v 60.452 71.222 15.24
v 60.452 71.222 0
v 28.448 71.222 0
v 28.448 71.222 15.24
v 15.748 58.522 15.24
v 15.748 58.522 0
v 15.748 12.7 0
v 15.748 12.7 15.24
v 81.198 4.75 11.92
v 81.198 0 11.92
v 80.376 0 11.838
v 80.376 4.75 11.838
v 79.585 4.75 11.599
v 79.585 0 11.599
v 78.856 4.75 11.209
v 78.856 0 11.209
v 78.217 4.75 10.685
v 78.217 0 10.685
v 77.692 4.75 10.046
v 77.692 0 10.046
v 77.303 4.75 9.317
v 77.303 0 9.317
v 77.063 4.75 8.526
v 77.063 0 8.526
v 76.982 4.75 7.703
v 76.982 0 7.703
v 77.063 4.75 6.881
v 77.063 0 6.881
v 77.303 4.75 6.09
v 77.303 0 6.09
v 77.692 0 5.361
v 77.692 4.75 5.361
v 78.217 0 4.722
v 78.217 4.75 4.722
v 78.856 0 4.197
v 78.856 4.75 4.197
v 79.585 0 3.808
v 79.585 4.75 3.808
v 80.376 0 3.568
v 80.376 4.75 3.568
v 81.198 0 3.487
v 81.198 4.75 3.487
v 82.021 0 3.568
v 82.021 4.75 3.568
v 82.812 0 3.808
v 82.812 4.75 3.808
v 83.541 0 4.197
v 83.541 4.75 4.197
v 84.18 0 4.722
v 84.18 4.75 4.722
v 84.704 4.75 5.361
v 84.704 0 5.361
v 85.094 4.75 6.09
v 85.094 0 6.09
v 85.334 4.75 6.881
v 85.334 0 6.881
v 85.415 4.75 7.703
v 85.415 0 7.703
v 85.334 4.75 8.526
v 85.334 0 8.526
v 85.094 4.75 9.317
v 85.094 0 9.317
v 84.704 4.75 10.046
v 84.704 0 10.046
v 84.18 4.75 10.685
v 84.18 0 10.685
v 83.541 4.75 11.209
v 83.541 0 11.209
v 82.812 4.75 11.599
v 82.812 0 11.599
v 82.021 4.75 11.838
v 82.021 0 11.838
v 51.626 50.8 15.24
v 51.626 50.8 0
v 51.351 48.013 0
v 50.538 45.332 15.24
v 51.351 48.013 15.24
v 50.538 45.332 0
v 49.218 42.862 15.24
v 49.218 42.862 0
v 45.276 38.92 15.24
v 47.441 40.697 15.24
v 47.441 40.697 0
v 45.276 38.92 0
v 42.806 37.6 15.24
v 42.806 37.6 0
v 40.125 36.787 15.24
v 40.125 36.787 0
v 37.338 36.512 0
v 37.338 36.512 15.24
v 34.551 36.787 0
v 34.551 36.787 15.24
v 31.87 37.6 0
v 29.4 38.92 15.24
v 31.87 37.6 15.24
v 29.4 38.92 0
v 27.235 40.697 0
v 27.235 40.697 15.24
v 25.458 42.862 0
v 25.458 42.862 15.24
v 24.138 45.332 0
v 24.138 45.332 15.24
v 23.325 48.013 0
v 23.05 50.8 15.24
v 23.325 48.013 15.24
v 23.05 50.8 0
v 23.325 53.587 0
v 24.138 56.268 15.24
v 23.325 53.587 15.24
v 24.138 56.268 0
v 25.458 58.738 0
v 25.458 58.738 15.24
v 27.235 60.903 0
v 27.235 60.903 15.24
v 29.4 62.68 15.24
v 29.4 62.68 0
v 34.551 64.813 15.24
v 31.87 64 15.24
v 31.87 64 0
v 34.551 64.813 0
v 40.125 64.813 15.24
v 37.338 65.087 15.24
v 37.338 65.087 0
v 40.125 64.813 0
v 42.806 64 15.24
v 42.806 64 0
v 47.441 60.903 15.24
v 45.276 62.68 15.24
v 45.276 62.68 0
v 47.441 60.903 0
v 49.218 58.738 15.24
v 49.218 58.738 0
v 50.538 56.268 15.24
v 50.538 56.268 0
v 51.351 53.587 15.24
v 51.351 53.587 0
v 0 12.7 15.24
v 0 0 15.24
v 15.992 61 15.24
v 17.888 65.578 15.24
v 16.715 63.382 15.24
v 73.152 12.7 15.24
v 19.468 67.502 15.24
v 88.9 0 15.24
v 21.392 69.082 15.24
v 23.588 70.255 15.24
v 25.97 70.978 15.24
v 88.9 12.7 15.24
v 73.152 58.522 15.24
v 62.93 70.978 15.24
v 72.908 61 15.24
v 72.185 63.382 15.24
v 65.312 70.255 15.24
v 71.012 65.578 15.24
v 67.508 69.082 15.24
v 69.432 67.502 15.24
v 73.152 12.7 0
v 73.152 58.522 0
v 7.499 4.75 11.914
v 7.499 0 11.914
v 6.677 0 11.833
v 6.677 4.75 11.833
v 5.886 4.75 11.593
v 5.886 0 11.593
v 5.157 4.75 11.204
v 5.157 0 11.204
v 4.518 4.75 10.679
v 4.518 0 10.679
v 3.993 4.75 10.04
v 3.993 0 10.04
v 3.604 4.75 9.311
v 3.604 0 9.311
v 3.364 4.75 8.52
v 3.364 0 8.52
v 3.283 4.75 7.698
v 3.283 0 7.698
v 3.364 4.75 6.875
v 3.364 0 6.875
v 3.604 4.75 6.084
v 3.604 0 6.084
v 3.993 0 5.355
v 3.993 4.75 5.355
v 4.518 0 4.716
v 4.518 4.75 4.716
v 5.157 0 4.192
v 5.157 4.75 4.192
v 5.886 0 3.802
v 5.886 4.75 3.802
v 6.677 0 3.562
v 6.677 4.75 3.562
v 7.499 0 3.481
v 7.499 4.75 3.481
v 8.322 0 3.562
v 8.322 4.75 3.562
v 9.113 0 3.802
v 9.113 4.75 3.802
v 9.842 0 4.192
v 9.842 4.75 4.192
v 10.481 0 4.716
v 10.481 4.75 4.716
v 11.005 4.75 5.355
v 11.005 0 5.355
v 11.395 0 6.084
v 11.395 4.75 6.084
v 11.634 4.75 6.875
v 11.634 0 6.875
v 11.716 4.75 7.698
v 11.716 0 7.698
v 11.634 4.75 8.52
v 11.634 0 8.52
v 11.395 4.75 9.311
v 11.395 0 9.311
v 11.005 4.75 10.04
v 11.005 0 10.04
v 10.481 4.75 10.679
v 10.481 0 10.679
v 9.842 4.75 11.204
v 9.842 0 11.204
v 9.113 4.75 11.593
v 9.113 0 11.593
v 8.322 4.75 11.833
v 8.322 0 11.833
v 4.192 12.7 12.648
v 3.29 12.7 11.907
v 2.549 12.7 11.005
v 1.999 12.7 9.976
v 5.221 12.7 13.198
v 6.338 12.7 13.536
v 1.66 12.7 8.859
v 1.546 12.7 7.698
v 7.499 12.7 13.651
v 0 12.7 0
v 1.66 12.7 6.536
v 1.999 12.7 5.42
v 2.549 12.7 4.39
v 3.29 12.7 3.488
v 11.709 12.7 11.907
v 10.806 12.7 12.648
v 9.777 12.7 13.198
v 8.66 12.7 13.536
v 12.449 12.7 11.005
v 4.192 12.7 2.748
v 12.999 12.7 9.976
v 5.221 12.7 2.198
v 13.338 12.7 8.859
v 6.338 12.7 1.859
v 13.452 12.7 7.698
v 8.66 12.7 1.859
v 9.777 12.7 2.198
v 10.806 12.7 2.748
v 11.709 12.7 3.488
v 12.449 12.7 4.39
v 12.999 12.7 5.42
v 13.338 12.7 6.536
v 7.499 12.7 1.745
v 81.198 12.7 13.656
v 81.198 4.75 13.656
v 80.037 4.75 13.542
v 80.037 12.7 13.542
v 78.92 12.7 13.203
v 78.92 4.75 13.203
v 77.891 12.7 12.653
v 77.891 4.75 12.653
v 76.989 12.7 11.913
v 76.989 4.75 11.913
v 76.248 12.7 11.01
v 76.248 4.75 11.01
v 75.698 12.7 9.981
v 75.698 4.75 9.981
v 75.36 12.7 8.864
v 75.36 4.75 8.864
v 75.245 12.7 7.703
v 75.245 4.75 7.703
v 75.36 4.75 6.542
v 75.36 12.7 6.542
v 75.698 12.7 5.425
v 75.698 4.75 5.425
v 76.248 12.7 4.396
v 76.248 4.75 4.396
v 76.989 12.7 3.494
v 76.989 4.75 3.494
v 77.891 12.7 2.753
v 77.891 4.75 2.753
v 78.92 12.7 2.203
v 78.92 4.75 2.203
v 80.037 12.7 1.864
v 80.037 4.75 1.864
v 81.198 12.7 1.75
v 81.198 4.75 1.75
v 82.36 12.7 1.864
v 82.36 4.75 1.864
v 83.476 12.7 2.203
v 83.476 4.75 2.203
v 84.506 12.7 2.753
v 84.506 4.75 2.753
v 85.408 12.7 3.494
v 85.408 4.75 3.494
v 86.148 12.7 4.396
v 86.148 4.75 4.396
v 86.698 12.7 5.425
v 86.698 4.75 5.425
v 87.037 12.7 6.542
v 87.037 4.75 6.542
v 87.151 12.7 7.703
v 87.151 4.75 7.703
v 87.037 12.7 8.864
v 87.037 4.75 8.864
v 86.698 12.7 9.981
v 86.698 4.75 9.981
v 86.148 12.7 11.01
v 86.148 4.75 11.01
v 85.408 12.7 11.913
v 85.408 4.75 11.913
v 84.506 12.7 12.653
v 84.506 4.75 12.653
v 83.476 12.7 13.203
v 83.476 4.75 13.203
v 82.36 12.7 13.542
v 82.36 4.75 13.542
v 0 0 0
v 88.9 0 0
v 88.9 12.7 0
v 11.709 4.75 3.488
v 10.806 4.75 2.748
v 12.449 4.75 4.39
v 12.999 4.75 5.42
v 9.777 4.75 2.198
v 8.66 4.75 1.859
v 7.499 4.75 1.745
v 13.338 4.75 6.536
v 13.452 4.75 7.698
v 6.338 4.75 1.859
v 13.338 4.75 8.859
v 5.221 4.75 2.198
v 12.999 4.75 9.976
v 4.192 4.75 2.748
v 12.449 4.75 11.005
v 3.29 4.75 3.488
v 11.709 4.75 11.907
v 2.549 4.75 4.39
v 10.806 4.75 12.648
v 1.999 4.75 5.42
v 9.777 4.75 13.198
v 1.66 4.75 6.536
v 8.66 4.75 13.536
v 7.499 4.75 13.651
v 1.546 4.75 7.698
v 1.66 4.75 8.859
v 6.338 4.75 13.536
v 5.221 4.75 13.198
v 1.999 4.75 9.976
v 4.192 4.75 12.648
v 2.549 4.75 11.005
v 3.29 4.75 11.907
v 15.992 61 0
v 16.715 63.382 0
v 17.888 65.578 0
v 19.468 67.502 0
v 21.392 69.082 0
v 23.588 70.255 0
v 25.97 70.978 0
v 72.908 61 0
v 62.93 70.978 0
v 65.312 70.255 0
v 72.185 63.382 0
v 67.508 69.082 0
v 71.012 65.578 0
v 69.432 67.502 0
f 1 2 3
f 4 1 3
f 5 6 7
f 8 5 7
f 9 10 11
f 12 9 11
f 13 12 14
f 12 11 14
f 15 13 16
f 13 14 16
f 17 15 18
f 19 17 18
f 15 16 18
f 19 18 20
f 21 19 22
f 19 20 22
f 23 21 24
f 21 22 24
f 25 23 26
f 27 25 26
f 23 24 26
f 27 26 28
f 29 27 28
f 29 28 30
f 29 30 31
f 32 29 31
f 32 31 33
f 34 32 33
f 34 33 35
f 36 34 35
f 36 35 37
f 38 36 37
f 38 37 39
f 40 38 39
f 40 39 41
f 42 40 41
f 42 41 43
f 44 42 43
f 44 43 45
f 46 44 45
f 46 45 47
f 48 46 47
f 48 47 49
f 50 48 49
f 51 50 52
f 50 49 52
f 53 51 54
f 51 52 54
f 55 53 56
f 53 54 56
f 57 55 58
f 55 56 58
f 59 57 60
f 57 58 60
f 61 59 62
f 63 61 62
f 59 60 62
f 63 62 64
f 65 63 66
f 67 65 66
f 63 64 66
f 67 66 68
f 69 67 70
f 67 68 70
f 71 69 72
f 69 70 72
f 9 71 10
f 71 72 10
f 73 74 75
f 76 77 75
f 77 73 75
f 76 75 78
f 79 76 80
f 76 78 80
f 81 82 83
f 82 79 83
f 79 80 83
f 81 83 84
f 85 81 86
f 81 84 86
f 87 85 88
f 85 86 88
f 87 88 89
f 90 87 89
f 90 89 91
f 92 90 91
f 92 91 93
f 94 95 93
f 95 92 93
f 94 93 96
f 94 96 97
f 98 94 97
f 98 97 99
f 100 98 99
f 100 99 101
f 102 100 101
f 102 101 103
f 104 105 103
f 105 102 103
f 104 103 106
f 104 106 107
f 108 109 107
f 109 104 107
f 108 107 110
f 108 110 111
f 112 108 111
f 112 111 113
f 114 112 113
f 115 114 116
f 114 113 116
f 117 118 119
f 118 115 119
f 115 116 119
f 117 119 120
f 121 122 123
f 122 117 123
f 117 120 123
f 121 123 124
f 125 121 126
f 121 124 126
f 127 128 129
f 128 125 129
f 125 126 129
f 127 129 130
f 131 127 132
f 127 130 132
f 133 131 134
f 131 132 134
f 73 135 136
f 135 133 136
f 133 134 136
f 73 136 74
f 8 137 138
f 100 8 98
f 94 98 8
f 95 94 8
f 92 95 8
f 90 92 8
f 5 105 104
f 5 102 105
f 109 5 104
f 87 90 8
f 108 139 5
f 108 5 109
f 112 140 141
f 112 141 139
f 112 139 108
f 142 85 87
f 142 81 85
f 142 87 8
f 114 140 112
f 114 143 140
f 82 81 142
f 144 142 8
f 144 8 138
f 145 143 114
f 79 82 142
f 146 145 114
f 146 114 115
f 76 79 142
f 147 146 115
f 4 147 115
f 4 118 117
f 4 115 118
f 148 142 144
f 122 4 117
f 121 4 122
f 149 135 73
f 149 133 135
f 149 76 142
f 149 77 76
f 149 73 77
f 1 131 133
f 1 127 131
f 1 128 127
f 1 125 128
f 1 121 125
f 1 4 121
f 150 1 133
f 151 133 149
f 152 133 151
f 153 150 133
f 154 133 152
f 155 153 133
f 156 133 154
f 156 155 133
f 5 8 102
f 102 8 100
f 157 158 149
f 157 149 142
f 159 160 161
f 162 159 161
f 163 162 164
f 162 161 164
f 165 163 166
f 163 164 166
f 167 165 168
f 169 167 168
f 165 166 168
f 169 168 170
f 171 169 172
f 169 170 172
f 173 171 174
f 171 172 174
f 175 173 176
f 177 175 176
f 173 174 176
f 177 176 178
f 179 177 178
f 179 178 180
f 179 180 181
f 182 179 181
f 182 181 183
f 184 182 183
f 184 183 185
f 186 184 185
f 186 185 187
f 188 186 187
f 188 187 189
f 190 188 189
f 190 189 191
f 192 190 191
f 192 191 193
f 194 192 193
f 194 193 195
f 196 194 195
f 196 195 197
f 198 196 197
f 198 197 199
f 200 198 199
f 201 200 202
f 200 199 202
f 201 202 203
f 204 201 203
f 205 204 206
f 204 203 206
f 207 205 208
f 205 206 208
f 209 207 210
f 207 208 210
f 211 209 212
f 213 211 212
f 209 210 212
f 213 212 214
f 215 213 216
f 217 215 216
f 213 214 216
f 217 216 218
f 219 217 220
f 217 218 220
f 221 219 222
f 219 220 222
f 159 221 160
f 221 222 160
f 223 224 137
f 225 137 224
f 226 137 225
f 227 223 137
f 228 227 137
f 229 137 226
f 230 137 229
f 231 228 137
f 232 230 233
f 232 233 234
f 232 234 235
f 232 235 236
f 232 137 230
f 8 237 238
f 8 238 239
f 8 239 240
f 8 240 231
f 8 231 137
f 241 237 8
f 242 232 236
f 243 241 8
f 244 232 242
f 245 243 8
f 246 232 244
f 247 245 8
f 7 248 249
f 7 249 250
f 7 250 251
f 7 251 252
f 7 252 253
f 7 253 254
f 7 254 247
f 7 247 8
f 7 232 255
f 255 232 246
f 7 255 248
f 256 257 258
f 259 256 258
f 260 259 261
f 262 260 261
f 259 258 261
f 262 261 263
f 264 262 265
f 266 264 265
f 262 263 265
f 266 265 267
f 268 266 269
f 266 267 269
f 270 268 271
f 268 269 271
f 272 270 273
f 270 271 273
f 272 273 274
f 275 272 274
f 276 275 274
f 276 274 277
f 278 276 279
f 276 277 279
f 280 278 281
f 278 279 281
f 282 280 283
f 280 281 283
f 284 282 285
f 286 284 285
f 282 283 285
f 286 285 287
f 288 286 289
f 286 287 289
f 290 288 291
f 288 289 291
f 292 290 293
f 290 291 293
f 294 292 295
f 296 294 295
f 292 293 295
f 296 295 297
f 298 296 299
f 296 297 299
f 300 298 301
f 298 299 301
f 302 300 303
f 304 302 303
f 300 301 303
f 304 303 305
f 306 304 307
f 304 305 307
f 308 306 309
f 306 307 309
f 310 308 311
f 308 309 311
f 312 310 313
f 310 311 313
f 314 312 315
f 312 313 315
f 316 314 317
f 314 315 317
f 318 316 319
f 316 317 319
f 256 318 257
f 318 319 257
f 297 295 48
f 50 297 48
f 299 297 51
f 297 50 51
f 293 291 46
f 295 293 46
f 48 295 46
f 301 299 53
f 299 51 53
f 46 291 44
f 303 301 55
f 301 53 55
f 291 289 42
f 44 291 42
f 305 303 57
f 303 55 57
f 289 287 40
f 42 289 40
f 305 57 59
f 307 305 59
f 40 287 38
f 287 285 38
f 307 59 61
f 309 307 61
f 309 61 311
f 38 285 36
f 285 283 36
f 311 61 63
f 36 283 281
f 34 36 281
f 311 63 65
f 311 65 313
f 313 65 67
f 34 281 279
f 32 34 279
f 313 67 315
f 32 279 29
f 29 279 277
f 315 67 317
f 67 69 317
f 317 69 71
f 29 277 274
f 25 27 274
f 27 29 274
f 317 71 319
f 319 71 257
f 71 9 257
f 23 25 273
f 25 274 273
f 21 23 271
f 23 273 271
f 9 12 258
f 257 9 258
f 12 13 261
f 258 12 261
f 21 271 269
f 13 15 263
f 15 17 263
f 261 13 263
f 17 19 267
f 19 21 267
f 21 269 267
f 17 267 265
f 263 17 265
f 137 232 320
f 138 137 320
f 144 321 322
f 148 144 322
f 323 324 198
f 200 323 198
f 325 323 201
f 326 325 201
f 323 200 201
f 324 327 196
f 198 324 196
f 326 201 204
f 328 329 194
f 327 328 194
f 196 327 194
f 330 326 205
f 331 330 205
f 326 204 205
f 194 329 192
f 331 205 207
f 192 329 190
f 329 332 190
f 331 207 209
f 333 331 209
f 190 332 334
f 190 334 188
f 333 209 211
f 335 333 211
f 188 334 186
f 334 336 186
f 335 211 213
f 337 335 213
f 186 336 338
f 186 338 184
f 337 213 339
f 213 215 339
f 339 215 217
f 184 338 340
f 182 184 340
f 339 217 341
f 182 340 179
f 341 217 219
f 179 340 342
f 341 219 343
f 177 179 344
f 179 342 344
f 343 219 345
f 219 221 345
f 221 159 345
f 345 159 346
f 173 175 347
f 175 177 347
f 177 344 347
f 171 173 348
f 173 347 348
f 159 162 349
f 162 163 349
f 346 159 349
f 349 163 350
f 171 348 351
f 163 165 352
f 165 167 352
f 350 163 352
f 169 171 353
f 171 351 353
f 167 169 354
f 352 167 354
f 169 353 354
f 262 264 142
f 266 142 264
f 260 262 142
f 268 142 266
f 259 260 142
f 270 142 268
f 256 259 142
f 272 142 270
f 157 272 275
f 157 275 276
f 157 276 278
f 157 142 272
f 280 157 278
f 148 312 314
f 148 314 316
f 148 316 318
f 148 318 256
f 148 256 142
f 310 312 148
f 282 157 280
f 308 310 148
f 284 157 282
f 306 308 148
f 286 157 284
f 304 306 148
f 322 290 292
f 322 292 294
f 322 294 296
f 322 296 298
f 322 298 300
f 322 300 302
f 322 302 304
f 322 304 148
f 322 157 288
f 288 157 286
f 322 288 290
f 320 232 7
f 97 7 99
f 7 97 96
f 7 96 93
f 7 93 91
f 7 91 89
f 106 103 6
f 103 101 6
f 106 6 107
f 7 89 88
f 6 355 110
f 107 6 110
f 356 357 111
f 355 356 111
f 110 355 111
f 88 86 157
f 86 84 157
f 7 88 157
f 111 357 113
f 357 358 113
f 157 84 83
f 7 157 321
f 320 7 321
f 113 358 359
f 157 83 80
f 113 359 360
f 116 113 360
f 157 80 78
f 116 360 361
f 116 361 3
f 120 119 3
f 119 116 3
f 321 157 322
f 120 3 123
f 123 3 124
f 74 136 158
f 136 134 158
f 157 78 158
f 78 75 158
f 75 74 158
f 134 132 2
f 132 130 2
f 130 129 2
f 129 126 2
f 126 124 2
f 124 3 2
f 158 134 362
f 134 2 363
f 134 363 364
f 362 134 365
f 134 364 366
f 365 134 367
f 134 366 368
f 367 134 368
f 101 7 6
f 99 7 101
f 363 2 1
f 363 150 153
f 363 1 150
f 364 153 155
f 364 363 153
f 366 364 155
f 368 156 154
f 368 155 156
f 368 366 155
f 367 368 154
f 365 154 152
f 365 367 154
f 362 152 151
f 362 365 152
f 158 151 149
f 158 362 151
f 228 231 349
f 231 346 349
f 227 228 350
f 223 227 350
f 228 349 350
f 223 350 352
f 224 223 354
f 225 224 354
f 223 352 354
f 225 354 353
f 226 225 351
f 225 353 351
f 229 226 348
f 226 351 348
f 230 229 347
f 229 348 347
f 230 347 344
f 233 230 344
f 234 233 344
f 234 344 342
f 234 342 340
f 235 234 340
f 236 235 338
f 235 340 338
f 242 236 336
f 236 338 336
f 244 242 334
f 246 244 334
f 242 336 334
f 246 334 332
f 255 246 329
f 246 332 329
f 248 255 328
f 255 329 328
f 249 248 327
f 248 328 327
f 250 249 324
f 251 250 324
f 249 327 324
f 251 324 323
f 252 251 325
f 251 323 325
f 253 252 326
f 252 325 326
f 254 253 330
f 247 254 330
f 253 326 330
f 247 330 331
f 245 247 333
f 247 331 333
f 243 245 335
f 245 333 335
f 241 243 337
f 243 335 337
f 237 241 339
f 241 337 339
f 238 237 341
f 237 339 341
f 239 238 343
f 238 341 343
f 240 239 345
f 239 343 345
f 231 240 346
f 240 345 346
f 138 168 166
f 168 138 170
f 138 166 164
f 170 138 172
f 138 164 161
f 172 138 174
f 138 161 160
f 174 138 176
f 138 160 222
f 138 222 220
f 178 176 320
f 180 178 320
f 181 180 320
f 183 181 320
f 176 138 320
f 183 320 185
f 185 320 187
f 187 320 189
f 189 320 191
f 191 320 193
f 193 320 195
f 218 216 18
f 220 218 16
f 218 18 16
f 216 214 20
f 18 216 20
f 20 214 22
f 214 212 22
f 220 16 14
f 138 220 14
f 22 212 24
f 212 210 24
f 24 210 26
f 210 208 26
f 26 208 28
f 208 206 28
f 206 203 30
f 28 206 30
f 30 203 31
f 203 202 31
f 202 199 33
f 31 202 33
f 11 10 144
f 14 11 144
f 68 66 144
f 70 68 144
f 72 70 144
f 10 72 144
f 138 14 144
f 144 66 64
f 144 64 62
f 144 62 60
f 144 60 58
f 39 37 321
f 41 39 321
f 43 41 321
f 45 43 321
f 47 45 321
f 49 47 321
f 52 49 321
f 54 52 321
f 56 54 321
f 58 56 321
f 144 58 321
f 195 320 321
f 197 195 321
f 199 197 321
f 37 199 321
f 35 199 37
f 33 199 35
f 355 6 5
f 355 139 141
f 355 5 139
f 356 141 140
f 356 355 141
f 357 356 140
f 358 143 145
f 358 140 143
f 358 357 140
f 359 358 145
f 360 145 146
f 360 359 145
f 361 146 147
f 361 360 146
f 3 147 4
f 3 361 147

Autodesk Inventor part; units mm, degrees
ref_plane "YZ Plane" through (0, 0, 0) normal (1, 0, 0) x (0, 1, 0)
ref_plane "XZ Plane" through (0, 0, 0) normal (0, 1, 0) x (-1, 0, 0)
ref_plane "XY Plane" through (0, 0, 0) normal (0, 0, 1) x (1, 0, 0)
sketch "Sketch1" plane through (0, 0, 0) normal (0, 0, 1) x (1, 0, 0)
  line L0 (0, 0) -> (88.9, 0)
  line L1 (88.9, 0) -> (88.9, 12.7)
  line L2 (0, 12.7) -> (0, 0)
  line L3 (0, 12.7) -> (0, 0)
  circle A0 centre (37.338, 50.8) radius 14.2875
  line L4 (0, 0) -> (0, 12.7)
  line L5 (0, 0) -> (0, 12.7)
  line L6 (0, 12.7) -> (15.748, 12.7)
  line L7 (13.208, 0) -> (0, 0)
  line L8 (15.748, 12.7) -> (0, 12.7)
  line L9 (15.748, 54.61) -> (15.748, 12.7)
  line L10 (88.9, 0) -> (62.992, 0)
  line L11 (73.152, 12.7) -> (88.9, 12.7)
  line L12 (88.9, 12.7) -> (88.9, 0)
  line L13 (73.152, 12.7) -> (73.152, 54.61)
  line L14 (60.452, 71.222) -> (28.448, 71.222)
  line L15 (15.748, 54.61) -> (15.748, 58.522)
  line L16 (73.152, 58.522) -> (73.152, 54.61)
  arc A1 (28.448, 71.222) -> (15.748, 58.522) centre (28.448, 58.522) ccw
  arc A2 (73.152, 58.522) -> (60.452, 71.222) centre (60.452, 58.522) ccw
  point P0 (65.9232, 76.2)
  point P1 (0, 12.7)
  dimension "d9" = 28.575
  dimension "d10" = 88.9
  dimension "d56" = 12.7
  dimension "d57" = 15.748
  dimension "d79" = 21.59
  dimension "d83" = 15.748
  dimension "d87" = 12.7
  dimension "d111" = 41.91
  dimension "d112" = 41.91
  dimension "d118" = 25.4
  dimension "d119" = 12.7
extrude "Extrusion7" add sketch "Sketch1" along normal blind 15.24
sketch "Sketch9" plane through (73.152, 12.7, 0) normal (0, 1, 0) x (1, 0, 0)
  point P0 (-73.152, 0)
  point P1 (8.0463, -7.7031)
hole "Hole4" at (81.1983, 12.7, 7.7031) direction (0, -1, 0) diameter 8.4328 end through all counterbore diameter 11.9062 counterbore depth 7.9502 clearance for "Socket Head Cap Screw" size "5/16" standard "Ansi Unified Screw Threads"
sketch "Sketch10" plane through (0.0713, 12.7, -0.0767) normal (0, 1, 0) x (1, 0, 0)
  point P0 (-75.692, 0)
  point P1 (7.4278, -7.7745)
hole "Hole5" at (7.4991, 12.7, 7.6977) direction (0, -1, 0) diameter 8.4328 end through all counterbore diameter 11.9062 counterbore depth 7.9502 clearance for "Socket Head Cap Screw" size "5/16" standard "Ansi Unified Screw Threads"
properties part number "Updated Support"
